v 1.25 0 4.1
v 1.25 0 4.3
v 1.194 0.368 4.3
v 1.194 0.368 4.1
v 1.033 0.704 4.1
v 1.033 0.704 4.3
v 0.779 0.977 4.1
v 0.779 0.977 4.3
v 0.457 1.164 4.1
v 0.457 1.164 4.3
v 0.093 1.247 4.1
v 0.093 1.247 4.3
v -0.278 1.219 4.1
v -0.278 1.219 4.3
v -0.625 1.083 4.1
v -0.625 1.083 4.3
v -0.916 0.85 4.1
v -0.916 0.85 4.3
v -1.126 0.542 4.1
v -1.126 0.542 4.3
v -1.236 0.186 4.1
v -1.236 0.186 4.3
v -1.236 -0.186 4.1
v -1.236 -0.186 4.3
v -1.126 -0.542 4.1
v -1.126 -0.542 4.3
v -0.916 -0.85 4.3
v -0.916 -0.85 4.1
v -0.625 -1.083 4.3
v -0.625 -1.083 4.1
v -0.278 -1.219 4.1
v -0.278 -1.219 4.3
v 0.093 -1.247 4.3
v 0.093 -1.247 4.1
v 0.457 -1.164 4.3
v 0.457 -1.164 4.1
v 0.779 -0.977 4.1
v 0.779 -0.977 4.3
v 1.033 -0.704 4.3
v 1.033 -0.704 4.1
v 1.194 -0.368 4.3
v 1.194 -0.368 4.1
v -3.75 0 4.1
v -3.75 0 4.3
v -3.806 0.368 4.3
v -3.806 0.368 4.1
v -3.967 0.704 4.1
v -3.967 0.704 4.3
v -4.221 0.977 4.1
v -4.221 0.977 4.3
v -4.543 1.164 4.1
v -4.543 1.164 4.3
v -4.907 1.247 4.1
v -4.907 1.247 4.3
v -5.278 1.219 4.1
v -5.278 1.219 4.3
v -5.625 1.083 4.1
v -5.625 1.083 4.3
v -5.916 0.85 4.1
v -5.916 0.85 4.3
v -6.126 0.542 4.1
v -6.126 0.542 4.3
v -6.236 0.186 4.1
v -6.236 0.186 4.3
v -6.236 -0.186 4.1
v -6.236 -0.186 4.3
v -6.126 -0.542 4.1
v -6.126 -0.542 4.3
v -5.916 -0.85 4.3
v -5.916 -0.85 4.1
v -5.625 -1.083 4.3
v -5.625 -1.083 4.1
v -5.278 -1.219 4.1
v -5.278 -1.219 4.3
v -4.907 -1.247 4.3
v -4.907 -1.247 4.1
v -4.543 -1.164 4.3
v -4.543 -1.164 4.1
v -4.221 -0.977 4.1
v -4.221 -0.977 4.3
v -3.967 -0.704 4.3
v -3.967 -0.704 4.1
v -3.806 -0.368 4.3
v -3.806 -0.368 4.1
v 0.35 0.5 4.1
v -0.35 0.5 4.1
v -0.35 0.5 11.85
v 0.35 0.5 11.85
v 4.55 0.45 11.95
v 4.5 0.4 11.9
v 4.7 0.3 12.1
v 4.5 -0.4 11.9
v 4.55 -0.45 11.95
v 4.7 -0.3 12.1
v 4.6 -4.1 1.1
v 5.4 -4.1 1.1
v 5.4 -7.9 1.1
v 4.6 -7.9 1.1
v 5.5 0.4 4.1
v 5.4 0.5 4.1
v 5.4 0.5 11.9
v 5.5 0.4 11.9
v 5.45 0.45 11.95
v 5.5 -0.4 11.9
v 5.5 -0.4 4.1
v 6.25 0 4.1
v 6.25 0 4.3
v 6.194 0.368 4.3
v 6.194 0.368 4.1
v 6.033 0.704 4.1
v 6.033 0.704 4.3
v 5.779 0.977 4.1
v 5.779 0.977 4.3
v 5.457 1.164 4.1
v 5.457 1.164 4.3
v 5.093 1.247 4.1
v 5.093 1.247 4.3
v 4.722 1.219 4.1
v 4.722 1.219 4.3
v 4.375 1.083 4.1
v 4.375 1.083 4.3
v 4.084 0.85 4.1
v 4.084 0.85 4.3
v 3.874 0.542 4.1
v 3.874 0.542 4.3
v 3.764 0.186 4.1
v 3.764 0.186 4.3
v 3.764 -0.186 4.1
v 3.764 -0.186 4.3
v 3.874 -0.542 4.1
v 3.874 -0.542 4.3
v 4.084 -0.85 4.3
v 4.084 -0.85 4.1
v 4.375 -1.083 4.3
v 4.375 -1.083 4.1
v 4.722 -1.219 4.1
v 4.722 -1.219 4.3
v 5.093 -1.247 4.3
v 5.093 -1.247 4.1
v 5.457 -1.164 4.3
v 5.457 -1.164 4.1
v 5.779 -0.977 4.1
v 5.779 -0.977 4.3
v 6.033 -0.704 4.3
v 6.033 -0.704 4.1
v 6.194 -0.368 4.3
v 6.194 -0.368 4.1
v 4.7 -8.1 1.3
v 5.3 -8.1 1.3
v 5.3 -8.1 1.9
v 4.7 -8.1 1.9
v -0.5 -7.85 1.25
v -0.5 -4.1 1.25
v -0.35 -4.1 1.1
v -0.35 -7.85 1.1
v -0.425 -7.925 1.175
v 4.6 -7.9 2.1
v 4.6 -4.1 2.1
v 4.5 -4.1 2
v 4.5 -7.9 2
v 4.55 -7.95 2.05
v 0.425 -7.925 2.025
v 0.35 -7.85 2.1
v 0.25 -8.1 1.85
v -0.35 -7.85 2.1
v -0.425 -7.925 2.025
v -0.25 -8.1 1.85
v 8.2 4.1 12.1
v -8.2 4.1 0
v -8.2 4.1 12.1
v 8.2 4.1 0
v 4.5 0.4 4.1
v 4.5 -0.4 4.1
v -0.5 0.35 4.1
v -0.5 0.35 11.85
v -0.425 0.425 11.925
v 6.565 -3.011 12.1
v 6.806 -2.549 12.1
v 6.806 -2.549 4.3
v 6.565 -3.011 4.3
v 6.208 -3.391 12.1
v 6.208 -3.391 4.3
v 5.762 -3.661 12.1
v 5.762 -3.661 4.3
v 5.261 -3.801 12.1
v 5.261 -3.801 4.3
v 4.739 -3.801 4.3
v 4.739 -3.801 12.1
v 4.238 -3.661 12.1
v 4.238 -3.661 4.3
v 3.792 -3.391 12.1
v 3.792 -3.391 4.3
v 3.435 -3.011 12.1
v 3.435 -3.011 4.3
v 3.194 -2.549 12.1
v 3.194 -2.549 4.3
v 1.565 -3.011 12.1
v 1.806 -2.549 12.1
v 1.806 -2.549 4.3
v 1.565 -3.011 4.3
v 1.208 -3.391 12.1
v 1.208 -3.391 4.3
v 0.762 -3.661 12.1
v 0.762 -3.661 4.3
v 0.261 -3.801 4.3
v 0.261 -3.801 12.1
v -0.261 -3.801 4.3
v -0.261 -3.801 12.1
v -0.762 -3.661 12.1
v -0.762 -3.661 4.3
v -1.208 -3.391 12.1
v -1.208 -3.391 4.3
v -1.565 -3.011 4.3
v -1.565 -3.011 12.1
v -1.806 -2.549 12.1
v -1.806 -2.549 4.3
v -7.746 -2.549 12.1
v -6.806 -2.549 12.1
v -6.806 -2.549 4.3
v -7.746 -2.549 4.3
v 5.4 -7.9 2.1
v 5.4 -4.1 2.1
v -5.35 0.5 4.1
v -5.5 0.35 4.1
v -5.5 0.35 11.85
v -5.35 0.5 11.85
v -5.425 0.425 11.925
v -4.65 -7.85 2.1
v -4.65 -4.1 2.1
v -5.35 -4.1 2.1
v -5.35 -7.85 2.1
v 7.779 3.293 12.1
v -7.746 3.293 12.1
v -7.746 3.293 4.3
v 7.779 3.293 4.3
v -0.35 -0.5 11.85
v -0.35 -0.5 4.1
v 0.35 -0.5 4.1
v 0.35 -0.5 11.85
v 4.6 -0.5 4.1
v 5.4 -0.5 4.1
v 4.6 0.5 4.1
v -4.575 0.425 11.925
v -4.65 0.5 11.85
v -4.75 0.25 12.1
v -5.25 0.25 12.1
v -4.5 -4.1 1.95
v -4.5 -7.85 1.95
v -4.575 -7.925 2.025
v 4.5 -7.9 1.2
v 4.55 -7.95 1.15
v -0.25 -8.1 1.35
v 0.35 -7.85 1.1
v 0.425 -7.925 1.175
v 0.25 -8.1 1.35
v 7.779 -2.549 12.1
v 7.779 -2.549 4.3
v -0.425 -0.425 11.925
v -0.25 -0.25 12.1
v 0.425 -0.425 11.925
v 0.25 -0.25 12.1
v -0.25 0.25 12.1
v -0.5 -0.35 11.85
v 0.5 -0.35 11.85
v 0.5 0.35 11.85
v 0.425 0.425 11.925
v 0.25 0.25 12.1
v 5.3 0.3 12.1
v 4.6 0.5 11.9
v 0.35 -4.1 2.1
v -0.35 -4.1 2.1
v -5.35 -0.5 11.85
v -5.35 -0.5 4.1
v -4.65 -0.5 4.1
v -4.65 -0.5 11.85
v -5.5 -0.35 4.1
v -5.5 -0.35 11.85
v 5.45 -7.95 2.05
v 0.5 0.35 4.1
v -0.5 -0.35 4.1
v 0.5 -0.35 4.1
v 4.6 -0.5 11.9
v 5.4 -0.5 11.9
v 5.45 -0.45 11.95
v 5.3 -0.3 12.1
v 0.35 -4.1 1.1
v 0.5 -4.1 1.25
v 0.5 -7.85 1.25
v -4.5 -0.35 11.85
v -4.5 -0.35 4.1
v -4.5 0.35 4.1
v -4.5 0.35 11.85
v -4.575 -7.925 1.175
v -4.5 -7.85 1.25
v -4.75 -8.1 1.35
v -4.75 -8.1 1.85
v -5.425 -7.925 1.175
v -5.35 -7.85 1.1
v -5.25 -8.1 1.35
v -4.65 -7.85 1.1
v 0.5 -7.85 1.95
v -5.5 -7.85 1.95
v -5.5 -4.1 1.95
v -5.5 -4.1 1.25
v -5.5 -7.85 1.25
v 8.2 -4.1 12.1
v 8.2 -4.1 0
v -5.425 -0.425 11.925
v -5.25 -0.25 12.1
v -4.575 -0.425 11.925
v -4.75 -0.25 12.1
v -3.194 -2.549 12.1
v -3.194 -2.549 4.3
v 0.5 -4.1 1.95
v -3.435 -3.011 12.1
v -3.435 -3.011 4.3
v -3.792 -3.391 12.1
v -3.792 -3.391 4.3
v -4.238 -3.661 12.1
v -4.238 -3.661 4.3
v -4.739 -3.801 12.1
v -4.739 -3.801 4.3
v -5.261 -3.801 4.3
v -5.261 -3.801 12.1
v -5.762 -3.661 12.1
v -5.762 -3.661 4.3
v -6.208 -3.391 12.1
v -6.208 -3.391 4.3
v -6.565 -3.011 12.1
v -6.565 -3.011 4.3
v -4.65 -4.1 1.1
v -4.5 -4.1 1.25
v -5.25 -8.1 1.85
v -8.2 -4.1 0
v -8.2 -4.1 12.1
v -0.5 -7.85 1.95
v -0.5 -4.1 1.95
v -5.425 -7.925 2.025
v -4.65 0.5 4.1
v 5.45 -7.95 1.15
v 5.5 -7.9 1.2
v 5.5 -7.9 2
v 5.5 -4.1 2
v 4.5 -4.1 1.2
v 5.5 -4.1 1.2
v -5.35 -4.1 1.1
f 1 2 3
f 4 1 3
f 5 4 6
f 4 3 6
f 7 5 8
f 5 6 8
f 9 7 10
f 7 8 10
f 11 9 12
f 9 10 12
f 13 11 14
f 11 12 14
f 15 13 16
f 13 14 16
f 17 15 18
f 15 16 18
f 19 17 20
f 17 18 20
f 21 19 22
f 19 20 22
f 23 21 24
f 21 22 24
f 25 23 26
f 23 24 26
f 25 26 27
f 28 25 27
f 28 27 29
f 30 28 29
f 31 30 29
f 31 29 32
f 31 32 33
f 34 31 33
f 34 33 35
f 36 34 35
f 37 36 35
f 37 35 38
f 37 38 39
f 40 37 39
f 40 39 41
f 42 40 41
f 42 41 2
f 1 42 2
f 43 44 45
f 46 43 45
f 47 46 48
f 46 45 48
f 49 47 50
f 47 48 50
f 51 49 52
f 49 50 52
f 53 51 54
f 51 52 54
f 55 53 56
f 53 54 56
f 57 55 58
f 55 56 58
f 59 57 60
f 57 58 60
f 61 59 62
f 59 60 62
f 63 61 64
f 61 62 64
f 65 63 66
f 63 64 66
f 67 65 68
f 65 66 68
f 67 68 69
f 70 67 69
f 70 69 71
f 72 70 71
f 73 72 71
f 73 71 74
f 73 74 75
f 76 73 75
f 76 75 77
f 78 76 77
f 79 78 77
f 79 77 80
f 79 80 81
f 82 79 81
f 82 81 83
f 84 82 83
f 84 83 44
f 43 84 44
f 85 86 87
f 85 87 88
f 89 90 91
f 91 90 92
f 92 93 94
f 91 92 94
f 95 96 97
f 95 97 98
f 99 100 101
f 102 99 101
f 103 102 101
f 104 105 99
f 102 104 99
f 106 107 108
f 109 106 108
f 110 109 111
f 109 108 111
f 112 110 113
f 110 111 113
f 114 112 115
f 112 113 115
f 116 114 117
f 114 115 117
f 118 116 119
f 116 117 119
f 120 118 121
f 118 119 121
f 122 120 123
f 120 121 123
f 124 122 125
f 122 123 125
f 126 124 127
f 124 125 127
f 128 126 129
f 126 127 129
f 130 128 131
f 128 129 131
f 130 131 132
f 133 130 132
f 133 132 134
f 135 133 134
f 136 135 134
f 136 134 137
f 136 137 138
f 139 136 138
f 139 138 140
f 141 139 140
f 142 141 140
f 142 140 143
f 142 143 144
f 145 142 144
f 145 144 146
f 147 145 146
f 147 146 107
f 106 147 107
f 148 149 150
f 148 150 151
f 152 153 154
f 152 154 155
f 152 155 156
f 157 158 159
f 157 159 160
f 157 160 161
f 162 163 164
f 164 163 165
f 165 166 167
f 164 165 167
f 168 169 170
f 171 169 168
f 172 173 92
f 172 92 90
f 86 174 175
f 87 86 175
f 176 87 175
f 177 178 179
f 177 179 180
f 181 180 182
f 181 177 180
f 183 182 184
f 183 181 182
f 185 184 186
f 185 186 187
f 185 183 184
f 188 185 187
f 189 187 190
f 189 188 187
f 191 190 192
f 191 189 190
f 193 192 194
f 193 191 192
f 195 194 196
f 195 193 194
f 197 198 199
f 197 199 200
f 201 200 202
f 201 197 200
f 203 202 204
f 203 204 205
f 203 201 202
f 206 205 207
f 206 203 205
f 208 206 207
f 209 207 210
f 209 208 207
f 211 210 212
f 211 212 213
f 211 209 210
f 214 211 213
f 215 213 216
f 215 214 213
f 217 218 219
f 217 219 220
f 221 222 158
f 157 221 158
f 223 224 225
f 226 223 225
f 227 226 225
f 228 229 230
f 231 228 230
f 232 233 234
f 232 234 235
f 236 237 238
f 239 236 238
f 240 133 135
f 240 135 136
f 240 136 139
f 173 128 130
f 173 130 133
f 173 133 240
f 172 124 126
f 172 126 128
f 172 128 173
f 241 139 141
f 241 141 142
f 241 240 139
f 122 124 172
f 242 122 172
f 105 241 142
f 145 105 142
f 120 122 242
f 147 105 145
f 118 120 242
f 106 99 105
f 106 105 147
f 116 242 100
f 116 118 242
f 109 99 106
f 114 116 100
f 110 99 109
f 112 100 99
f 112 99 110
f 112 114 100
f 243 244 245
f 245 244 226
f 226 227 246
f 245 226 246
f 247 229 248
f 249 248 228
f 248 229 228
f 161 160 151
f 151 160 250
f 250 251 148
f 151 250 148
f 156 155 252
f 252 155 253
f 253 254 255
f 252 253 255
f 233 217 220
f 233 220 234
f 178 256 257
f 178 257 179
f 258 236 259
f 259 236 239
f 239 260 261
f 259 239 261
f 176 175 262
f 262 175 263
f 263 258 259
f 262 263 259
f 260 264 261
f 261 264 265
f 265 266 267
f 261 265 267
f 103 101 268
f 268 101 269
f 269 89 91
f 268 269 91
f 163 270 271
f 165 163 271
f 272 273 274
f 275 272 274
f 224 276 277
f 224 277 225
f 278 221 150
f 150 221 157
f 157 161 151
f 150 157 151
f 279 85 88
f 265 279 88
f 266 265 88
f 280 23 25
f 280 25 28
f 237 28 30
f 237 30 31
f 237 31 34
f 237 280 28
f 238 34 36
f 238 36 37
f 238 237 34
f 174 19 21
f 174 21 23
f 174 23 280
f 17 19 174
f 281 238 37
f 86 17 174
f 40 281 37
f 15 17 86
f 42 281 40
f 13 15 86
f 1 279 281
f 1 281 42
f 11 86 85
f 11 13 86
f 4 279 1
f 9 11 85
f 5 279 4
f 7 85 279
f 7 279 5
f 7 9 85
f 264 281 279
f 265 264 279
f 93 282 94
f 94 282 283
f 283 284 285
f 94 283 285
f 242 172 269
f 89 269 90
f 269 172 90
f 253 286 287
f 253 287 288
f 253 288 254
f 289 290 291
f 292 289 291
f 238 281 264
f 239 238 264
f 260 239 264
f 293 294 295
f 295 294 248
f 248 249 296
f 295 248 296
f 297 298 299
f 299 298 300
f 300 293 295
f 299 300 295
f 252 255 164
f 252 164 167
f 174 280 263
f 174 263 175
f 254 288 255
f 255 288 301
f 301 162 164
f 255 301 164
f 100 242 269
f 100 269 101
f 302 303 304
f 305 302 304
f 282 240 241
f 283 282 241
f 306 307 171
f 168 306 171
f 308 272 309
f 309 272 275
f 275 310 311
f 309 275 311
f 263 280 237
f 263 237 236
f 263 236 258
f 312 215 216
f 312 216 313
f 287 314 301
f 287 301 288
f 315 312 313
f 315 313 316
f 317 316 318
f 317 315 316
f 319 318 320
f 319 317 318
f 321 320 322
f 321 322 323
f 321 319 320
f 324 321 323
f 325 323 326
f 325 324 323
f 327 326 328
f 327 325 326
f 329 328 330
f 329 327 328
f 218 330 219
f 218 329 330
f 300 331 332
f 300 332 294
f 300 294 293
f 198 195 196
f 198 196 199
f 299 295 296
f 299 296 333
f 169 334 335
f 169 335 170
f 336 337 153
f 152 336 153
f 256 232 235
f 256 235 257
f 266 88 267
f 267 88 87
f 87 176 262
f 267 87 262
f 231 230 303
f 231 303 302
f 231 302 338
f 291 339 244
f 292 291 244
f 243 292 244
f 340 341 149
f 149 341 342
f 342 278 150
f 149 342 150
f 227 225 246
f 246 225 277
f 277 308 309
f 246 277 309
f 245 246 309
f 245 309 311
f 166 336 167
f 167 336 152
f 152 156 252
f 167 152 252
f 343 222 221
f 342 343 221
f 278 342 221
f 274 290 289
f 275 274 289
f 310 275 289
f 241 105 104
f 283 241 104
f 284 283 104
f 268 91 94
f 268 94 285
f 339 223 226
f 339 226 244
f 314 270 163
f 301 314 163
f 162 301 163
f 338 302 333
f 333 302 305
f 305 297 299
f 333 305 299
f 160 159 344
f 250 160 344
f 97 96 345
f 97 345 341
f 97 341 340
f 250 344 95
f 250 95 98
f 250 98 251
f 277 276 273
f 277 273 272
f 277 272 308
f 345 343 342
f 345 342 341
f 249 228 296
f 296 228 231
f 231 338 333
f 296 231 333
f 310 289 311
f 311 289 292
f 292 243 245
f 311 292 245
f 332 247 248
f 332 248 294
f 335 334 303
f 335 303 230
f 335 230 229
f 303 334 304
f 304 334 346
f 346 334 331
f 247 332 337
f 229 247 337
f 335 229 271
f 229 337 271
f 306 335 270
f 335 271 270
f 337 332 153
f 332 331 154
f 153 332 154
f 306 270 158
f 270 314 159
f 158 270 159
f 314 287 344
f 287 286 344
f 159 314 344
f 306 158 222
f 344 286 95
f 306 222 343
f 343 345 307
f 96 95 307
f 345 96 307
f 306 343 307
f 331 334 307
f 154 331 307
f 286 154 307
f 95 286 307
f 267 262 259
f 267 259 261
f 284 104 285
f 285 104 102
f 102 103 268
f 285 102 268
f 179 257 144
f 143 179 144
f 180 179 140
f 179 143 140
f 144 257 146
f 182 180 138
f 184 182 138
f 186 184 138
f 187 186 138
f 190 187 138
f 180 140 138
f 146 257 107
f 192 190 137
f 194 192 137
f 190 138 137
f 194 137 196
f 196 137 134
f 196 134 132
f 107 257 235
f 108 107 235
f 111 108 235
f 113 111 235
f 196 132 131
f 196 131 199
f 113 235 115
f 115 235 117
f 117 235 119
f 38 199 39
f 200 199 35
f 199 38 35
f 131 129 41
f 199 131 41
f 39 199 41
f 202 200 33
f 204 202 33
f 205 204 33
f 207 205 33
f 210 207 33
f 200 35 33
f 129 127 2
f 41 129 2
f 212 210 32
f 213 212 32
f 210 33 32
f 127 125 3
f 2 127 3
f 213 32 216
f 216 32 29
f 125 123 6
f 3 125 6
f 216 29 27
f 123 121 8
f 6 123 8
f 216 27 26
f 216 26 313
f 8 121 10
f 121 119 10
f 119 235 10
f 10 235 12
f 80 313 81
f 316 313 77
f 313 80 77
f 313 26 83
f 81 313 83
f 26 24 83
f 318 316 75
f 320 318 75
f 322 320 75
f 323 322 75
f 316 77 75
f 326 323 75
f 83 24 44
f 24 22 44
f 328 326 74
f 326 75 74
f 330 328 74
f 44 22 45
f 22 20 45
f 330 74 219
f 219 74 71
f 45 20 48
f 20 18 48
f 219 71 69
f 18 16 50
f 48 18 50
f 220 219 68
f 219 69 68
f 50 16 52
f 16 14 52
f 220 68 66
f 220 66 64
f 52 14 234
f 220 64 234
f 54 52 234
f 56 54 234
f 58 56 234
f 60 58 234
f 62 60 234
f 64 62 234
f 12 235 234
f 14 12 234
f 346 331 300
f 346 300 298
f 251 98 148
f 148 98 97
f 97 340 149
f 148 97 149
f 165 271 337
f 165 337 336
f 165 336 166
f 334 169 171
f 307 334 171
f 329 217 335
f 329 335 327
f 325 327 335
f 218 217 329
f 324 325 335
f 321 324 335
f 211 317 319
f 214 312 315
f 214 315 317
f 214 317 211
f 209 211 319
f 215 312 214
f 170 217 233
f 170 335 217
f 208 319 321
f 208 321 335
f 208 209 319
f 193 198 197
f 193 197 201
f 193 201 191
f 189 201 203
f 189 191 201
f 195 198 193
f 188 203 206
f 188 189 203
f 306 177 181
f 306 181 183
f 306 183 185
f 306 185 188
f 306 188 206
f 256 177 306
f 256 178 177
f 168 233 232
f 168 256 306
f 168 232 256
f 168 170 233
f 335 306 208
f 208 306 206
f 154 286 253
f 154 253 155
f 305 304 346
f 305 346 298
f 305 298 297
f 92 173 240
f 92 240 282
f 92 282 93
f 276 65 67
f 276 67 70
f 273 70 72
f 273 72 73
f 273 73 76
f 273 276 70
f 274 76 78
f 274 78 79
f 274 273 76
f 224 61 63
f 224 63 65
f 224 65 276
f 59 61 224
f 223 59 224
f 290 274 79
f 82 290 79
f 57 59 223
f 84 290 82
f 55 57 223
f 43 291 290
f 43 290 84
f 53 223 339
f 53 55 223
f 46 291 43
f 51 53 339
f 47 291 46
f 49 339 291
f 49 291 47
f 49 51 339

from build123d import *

# Parameters (mm, degrees)
SKETCH_1_W          = 16.4
SKETCH_1_H          = 8.2
EXTRUDE_1_DEPTH     = 12.1
SKETCH_4_R          = 1.25
CUT_EXTRUDE_3_DEPTH = 8
CUT_EXTRUDE_4_DEPTH = 7.8
SKETCH_7_W          = 1
SKETCH_7_H          = 1
EXTRUDE_2_DEPTH     = 8
CHAMFER_1_SIZE      = 0.15
CHAMFER_2_SIZE      = 0.25
SKETCH_8_W          = 1
SKETCH_8_H          = 1
EXTRUDE_3_DEPTH     = 4
CHAMFER_3_SIZE      = 0.15
CHAMFER_4_SIZE      = 0.25
CHAMFER_6_SIZE      = 0.1
CHAMFER_7_SIZE      = 0.2
CHAMFER_8_SIZE      = 0.1
CHAMFER_9_SIZE      = 0.2


with BuildPart() as part:
    # Эскиз1 → Бобышка-Вытянуть1 (new body)
    with BuildSketch(Plane.XY):
        Rectangle(SKETCH_1_W, SKETCH_1_H)
    extrude(amount=EXTRUDE_1_DEPTH)

    # Эскиз4 → Вырез-Вытянуть3 (cut)
    with BuildSketch(Plane.XY.offset(12.1)):
        with Locations((-5, 0)):
            Circle(SKETCH_4_R)
        Circle(SKETCH_4_R)
        with Locations((5, 0)):
            Circle(SKETCH_4_R)
    extrude(amount=-CUT_EXTRUDE_3_DEPTH, mode=Mode.SUBTRACT)

    # Эскиз5 → Вырез-Вытянуть4 (cut)
    with BuildSketch(Plane.XY.offset(12.1)):
        with BuildLine():
            Line((-7.745621634, 0), (-7.745621634, 3.292901982))
            Line((-7.745621634, 3.292901982), (2.778509544, 3.292901982))
            Line((2.778509544, 3.292901982), (7.778509544, 3.292901982))
            Line((7.778509544, 3.292901982), (7.778509544, -2.548957219))
            Line((7.778509544, -2.548957219), (6.80582632, -2.548957219))
            ThreePointArc((6.80582632, -2.548957219), (5, -3.818893996), (3.19417368, -2.548957219))
            Line((3.19417368, -2.548957219), (1.80582632, -2.548957219))
            ThreePointArc((1.80582632, -2.548957219), (0, -3.818893996), (-1.80582632, -2.548957219))
            Line((-1.80582632, -2.548957219), (-3.19417368, -2.548957219))
            ThreePointArc((-3.19417368, -2.548957219), (-5, -3.818893996), (-6.80582632, -2.548957219))
            Line((-6.80582632, -2.548957219), (-7.745621634, -2.548957219))
            Line((-7.745621634, -2.548957219), (-7.745621634, 0))
        make_face()
    extrude(amount=-CUT_EXTRUDE_4_DEPTH, mode=Mode.SUBTRACT)

    # Эскиз7 → Бобышка-Вытянуть2 (add)
    with BuildSketch(Plane.XY.offset(4.1)):
        Rectangle(SKETCH_7_W, SKETCH_7_H)
        with Locations((-5, 0)):
            Rectangle(SKETCH_7_W, SKETCH_7_H)
        with Locations((5, 0)):
            Rectangle(SKETCH_7_W, SKETCH_7_H)
    extrude(amount=EXTRUDE_2_DEPTH)

    # Фаска1
    chamfer_1_edges = [part.edges().sort_by_distance(p)[0] for p in [
        (-4.5, -0.5, 8.1),
        (-4.5, 0.5, 8.1),
        (-5.5, 0.5, 8.1),
        (-5.5, -0.5, 8.1),
        (0.5, -0.5, 8.1),
        (0.5, 0.5, 8.1),
        (-0.5, 0.5, 8.1),
        (-0.5, -0.5, 8.1),
    ]]
    chamfer(chamfer_1_edges, length=CHAMFER_1_SIZE)

    # Фаска2
    # the kernel refuses this chamfer: 0.25 mm, written as the material it takes off along each edge
    with BuildSketch(Plane(origin=(-0.5, -0.992920747, 12.1), x_dir=(-0.027495876610586414, 0, -0.9996219169112968), z_dir=(0, 1, 0)), Plane(origin=(-0.992920747, 0.5, 12.1), x_dir=(0, 0.027495876610586414, -0.9996219169112968), z_dir=(1, 0, 0)), Plane(origin=(0.5, 0.992920747, 12.1), x_dir=(0.027495876610586414, 0, -0.9996219169112968), z_dir=(0, -1, 0)), Plane(origin=(0.992920747, -0.5, 12.1), x_dir=(0, -0.027495876610586414, -0.9996219169112968), z_dir=(-1, 0, 0)), Plane(origin=(-4.5, 0.992920747, 12.1), x_dir=(0.02749587661058555, 0, -0.9996219169112968), z_dir=(0, -1, 0)), Plane(origin=(-4.007079253, -0.5, 12.1), x_dir=(0, -0.027495876610586414, -0.9996219169112968), z_dir=(-1, 0, 0)), Plane(origin=(-5.5, -0.992920747, 12.1), x_dir=(-0.02749587661058555, 0, -0.9996219169112968), z_dir=(0, 1, 0)), Plane(origin=(-5.992920747, 0.5, 12.1), x_dir=(0, 0.027495876610586414, -0.9996219169112968), z_dir=(1, 0, 0))) as chamfer_2_piece_1:
        Polygon((CHAMFER_2_SIZE * 0.999621916911, -CHAMFER_2_SIZE * 0.0274958766106), (-CHAMFER_2_SIZE * 0.0274958766106, -CHAMFER_2_SIZE * 0.999621916911), (0, 0), align=None)
    extrude(amount=1.985841494, mode=Mode.SUBTRACT)

    # Эскиз8 → Бобышка-Вытянуть3 (add)
    with BuildSketch(Plane(origin=(0, -4.1, 0), x_dir=(-1, 0, 0), z_dir=(0, -1, 0))):
        with Locations((0, -1.6)):
            Rectangle(SKETCH_8_W, SKETCH_8_H)
        with Locations((5, -1.6)):
            Rectangle(SKETCH_8_W, SKETCH_8_H)
        with Locations((-5, -1.6)):
            Rectangle(SKETCH_8_W, SKETCH_8_H)
    extrude(amount=EXTRUDE_3_DEPTH)

    # Фаска3
    chamfer_3_edges = [part.edges().sort_by_distance(p)[0] for p in [
        (-4.5, -6.1, 1.1),
        (-4.5, -6.1, 2.1),
        (-5.5, -6.1, 2.1),
        (-5.5, -6.1, 1.1),
        (0.5, -6.1, 1.1),
        (0.5, -6.1, 2.1),
        (-0.5, -6.1, 2.1),
        (-0.5, -6.1, 1.1),
    ]]
    chamfer(chamfer_3_edges, length=CHAMFER_3_SIZE)

    # Фаска4
    # the kernel refuses this chamfer: 0.25 mm, written as the material it takes off along each edge
    with BuildSketch(Plane(origin=(0.5, -8.1, 2.592920747), x_dir=(0.02749587661058651, 0.9996219169112968, 0), z_dir=(0, 0, -1)), Plane(origin=(-0.5, -8.1, 0.607079253), x_dir=(-0.02749587661058651, 0.9996219169112968, 0), z_dir=(0, 0, 1)), Plane(origin=(-0.992920747, -8.1, 2.1), x_dir=(0, 0.9996219169112968, 0.027495876610585647), z_dir=(1, 0, 0)), Plane(origin=(0.992920747, -8.1, 1.1), x_dir=(0, 0.9996219169112968, -0.02749587661058651), z_dir=(-1, 0, 0)), Plane(origin=(-5.5, -8.1, 0.607079253), x_dir=(-0.027495876610585647, 0.9996219169112968, 0), z_dir=(0, 0, 1)), Plane(origin=(-5.992920747, -8.1, 2.1), x_dir=(0, 0.9996219169112968, 0.027495876610585647), z_dir=(1, 0, 0)), Plane(origin=(-4.5, -8.1, 2.592920747), x_dir=(0.027495876610585647, 0.9996219169112968, 0), z_dir=(0, 0, -1)), Plane(origin=(-4.007079253, -8.1, 1.1), x_dir=(0, 0.9996219169112968, -0.02749587661058651), z_dir=(-1, 0, 0))) as chamfer_4_piece_1:
        Polygon((CHAMFER_4_SIZE * 0.999621916911, -CHAMFER_4_SIZE * 0.0274958766106), (-CHAMFER_4_SIZE * 0.0274958766106, -CHAMFER_4_SIZE * 0.999621916911), (0, 0), align=None)
    extrude(amount=1.985841494, mode=Mode.SUBTRACT)

    # Фаска6
    chamfer_6_edges = [part.edges().sort_by_distance(p)[0] for p in [
        (5.5, -0.5, 8.1),
        (5.5, 0.5, 8.1),
        (4.5, 0.5, 8.1),
        (4.5, -0.5, 8.1),
    ]]
    chamfer(chamfer_6_edges, length=CHAMFER_6_SIZE)

    # Фаска7
    # the kernel refuses this chamfer: 0.2 mm, written as the material it takes off along each edge
    with BuildSketch(Plane(origin=(5.5, 0.914336598, 12.1), x_dir=(0.02749587661058742, 0, -0.9996219169112966), z_dir=(0, -1, 0)), Plane(origin=(5.914336598, -0.5, 12.1), x_dir=(0, -0.02749587661058634, -0.9996219169112966), z_dir=(-1, 0, 0)), Plane(origin=(4.5, -0.914336598, 12.1), x_dir=(-0.02749587661058742, 0, -0.9996219169112966), z_dir=(0, 1, 0)), Plane(origin=(4.085663402, 0.5, 12.1), x_dir=(0, 0.02749587661058634, -0.9996219169112966), z_dir=(1, 0, 0))) as chamfer_7_piece_1:
        Polygon((CHAMFER_7_SIZE * 0.999621916911, -CHAMFER_7_SIZE * 0.0274958766106), (-CHAMFER_7_SIZE * 0.0274958766106, -CHAMFER_7_SIZE * 0.999621916911), (0, 0), align=None)
    extrude(amount=1.828673195, mode=Mode.SUBTRACT)

    # Фаска8
    chamfer_8_edges = [part.edges().sort_by_distance(p)[0] for p in [
        (5.5, -6.1, 1.1),
        (5.5, -6.1, 2.1),
        (4.5, -6.1, 2.1),
        (4.5, -6.1, 1.1),
    ]]
    chamfer(chamfer_8_edges, length=CHAMFER_8_SIZE)

    # Фаска9
    # the kernel refuses this chamfer: 0.2 mm, written as the material it takes off along each edge
    with BuildSketch(Plane(origin=(5.5, -8.1, 2.514336598), x_dir=(0.027495876610587302, 0.9996219169112966, 0), z_dir=(0, 0, -1)), Plane(origin=(5.914336598, -8.1, 1.1), x_dir=(0, 0.9996219169112968, -0.027495876610586226), z_dir=(-1, 0, 0)), Plane(origin=(4.5, -8.1, 0.685663402), x_dir=(-0.027495876610587302, 0.9996219169112966, 0), z_dir=(0, 0, 1)), Plane(origin=(4.085663402, -8.1, 2.1), x_dir=(0, 0.9996219169112966, 0.027495876610587302), z_dir=(1, 0, 0))) as chamfer_9_piece_1:
        Polygon((CHAMFER_9_SIZE * 0.999621916911, -CHAMFER_9_SIZE * 0.0274958766106), (-CHAMFER_9_SIZE * 0.0274958766106, -CHAMFER_9_SIZE * 0.999621916911), (0, 0), align=None)
    extrude(amount=1.828673195, mode=Mode.SUBTRACT)


solid = part.part
